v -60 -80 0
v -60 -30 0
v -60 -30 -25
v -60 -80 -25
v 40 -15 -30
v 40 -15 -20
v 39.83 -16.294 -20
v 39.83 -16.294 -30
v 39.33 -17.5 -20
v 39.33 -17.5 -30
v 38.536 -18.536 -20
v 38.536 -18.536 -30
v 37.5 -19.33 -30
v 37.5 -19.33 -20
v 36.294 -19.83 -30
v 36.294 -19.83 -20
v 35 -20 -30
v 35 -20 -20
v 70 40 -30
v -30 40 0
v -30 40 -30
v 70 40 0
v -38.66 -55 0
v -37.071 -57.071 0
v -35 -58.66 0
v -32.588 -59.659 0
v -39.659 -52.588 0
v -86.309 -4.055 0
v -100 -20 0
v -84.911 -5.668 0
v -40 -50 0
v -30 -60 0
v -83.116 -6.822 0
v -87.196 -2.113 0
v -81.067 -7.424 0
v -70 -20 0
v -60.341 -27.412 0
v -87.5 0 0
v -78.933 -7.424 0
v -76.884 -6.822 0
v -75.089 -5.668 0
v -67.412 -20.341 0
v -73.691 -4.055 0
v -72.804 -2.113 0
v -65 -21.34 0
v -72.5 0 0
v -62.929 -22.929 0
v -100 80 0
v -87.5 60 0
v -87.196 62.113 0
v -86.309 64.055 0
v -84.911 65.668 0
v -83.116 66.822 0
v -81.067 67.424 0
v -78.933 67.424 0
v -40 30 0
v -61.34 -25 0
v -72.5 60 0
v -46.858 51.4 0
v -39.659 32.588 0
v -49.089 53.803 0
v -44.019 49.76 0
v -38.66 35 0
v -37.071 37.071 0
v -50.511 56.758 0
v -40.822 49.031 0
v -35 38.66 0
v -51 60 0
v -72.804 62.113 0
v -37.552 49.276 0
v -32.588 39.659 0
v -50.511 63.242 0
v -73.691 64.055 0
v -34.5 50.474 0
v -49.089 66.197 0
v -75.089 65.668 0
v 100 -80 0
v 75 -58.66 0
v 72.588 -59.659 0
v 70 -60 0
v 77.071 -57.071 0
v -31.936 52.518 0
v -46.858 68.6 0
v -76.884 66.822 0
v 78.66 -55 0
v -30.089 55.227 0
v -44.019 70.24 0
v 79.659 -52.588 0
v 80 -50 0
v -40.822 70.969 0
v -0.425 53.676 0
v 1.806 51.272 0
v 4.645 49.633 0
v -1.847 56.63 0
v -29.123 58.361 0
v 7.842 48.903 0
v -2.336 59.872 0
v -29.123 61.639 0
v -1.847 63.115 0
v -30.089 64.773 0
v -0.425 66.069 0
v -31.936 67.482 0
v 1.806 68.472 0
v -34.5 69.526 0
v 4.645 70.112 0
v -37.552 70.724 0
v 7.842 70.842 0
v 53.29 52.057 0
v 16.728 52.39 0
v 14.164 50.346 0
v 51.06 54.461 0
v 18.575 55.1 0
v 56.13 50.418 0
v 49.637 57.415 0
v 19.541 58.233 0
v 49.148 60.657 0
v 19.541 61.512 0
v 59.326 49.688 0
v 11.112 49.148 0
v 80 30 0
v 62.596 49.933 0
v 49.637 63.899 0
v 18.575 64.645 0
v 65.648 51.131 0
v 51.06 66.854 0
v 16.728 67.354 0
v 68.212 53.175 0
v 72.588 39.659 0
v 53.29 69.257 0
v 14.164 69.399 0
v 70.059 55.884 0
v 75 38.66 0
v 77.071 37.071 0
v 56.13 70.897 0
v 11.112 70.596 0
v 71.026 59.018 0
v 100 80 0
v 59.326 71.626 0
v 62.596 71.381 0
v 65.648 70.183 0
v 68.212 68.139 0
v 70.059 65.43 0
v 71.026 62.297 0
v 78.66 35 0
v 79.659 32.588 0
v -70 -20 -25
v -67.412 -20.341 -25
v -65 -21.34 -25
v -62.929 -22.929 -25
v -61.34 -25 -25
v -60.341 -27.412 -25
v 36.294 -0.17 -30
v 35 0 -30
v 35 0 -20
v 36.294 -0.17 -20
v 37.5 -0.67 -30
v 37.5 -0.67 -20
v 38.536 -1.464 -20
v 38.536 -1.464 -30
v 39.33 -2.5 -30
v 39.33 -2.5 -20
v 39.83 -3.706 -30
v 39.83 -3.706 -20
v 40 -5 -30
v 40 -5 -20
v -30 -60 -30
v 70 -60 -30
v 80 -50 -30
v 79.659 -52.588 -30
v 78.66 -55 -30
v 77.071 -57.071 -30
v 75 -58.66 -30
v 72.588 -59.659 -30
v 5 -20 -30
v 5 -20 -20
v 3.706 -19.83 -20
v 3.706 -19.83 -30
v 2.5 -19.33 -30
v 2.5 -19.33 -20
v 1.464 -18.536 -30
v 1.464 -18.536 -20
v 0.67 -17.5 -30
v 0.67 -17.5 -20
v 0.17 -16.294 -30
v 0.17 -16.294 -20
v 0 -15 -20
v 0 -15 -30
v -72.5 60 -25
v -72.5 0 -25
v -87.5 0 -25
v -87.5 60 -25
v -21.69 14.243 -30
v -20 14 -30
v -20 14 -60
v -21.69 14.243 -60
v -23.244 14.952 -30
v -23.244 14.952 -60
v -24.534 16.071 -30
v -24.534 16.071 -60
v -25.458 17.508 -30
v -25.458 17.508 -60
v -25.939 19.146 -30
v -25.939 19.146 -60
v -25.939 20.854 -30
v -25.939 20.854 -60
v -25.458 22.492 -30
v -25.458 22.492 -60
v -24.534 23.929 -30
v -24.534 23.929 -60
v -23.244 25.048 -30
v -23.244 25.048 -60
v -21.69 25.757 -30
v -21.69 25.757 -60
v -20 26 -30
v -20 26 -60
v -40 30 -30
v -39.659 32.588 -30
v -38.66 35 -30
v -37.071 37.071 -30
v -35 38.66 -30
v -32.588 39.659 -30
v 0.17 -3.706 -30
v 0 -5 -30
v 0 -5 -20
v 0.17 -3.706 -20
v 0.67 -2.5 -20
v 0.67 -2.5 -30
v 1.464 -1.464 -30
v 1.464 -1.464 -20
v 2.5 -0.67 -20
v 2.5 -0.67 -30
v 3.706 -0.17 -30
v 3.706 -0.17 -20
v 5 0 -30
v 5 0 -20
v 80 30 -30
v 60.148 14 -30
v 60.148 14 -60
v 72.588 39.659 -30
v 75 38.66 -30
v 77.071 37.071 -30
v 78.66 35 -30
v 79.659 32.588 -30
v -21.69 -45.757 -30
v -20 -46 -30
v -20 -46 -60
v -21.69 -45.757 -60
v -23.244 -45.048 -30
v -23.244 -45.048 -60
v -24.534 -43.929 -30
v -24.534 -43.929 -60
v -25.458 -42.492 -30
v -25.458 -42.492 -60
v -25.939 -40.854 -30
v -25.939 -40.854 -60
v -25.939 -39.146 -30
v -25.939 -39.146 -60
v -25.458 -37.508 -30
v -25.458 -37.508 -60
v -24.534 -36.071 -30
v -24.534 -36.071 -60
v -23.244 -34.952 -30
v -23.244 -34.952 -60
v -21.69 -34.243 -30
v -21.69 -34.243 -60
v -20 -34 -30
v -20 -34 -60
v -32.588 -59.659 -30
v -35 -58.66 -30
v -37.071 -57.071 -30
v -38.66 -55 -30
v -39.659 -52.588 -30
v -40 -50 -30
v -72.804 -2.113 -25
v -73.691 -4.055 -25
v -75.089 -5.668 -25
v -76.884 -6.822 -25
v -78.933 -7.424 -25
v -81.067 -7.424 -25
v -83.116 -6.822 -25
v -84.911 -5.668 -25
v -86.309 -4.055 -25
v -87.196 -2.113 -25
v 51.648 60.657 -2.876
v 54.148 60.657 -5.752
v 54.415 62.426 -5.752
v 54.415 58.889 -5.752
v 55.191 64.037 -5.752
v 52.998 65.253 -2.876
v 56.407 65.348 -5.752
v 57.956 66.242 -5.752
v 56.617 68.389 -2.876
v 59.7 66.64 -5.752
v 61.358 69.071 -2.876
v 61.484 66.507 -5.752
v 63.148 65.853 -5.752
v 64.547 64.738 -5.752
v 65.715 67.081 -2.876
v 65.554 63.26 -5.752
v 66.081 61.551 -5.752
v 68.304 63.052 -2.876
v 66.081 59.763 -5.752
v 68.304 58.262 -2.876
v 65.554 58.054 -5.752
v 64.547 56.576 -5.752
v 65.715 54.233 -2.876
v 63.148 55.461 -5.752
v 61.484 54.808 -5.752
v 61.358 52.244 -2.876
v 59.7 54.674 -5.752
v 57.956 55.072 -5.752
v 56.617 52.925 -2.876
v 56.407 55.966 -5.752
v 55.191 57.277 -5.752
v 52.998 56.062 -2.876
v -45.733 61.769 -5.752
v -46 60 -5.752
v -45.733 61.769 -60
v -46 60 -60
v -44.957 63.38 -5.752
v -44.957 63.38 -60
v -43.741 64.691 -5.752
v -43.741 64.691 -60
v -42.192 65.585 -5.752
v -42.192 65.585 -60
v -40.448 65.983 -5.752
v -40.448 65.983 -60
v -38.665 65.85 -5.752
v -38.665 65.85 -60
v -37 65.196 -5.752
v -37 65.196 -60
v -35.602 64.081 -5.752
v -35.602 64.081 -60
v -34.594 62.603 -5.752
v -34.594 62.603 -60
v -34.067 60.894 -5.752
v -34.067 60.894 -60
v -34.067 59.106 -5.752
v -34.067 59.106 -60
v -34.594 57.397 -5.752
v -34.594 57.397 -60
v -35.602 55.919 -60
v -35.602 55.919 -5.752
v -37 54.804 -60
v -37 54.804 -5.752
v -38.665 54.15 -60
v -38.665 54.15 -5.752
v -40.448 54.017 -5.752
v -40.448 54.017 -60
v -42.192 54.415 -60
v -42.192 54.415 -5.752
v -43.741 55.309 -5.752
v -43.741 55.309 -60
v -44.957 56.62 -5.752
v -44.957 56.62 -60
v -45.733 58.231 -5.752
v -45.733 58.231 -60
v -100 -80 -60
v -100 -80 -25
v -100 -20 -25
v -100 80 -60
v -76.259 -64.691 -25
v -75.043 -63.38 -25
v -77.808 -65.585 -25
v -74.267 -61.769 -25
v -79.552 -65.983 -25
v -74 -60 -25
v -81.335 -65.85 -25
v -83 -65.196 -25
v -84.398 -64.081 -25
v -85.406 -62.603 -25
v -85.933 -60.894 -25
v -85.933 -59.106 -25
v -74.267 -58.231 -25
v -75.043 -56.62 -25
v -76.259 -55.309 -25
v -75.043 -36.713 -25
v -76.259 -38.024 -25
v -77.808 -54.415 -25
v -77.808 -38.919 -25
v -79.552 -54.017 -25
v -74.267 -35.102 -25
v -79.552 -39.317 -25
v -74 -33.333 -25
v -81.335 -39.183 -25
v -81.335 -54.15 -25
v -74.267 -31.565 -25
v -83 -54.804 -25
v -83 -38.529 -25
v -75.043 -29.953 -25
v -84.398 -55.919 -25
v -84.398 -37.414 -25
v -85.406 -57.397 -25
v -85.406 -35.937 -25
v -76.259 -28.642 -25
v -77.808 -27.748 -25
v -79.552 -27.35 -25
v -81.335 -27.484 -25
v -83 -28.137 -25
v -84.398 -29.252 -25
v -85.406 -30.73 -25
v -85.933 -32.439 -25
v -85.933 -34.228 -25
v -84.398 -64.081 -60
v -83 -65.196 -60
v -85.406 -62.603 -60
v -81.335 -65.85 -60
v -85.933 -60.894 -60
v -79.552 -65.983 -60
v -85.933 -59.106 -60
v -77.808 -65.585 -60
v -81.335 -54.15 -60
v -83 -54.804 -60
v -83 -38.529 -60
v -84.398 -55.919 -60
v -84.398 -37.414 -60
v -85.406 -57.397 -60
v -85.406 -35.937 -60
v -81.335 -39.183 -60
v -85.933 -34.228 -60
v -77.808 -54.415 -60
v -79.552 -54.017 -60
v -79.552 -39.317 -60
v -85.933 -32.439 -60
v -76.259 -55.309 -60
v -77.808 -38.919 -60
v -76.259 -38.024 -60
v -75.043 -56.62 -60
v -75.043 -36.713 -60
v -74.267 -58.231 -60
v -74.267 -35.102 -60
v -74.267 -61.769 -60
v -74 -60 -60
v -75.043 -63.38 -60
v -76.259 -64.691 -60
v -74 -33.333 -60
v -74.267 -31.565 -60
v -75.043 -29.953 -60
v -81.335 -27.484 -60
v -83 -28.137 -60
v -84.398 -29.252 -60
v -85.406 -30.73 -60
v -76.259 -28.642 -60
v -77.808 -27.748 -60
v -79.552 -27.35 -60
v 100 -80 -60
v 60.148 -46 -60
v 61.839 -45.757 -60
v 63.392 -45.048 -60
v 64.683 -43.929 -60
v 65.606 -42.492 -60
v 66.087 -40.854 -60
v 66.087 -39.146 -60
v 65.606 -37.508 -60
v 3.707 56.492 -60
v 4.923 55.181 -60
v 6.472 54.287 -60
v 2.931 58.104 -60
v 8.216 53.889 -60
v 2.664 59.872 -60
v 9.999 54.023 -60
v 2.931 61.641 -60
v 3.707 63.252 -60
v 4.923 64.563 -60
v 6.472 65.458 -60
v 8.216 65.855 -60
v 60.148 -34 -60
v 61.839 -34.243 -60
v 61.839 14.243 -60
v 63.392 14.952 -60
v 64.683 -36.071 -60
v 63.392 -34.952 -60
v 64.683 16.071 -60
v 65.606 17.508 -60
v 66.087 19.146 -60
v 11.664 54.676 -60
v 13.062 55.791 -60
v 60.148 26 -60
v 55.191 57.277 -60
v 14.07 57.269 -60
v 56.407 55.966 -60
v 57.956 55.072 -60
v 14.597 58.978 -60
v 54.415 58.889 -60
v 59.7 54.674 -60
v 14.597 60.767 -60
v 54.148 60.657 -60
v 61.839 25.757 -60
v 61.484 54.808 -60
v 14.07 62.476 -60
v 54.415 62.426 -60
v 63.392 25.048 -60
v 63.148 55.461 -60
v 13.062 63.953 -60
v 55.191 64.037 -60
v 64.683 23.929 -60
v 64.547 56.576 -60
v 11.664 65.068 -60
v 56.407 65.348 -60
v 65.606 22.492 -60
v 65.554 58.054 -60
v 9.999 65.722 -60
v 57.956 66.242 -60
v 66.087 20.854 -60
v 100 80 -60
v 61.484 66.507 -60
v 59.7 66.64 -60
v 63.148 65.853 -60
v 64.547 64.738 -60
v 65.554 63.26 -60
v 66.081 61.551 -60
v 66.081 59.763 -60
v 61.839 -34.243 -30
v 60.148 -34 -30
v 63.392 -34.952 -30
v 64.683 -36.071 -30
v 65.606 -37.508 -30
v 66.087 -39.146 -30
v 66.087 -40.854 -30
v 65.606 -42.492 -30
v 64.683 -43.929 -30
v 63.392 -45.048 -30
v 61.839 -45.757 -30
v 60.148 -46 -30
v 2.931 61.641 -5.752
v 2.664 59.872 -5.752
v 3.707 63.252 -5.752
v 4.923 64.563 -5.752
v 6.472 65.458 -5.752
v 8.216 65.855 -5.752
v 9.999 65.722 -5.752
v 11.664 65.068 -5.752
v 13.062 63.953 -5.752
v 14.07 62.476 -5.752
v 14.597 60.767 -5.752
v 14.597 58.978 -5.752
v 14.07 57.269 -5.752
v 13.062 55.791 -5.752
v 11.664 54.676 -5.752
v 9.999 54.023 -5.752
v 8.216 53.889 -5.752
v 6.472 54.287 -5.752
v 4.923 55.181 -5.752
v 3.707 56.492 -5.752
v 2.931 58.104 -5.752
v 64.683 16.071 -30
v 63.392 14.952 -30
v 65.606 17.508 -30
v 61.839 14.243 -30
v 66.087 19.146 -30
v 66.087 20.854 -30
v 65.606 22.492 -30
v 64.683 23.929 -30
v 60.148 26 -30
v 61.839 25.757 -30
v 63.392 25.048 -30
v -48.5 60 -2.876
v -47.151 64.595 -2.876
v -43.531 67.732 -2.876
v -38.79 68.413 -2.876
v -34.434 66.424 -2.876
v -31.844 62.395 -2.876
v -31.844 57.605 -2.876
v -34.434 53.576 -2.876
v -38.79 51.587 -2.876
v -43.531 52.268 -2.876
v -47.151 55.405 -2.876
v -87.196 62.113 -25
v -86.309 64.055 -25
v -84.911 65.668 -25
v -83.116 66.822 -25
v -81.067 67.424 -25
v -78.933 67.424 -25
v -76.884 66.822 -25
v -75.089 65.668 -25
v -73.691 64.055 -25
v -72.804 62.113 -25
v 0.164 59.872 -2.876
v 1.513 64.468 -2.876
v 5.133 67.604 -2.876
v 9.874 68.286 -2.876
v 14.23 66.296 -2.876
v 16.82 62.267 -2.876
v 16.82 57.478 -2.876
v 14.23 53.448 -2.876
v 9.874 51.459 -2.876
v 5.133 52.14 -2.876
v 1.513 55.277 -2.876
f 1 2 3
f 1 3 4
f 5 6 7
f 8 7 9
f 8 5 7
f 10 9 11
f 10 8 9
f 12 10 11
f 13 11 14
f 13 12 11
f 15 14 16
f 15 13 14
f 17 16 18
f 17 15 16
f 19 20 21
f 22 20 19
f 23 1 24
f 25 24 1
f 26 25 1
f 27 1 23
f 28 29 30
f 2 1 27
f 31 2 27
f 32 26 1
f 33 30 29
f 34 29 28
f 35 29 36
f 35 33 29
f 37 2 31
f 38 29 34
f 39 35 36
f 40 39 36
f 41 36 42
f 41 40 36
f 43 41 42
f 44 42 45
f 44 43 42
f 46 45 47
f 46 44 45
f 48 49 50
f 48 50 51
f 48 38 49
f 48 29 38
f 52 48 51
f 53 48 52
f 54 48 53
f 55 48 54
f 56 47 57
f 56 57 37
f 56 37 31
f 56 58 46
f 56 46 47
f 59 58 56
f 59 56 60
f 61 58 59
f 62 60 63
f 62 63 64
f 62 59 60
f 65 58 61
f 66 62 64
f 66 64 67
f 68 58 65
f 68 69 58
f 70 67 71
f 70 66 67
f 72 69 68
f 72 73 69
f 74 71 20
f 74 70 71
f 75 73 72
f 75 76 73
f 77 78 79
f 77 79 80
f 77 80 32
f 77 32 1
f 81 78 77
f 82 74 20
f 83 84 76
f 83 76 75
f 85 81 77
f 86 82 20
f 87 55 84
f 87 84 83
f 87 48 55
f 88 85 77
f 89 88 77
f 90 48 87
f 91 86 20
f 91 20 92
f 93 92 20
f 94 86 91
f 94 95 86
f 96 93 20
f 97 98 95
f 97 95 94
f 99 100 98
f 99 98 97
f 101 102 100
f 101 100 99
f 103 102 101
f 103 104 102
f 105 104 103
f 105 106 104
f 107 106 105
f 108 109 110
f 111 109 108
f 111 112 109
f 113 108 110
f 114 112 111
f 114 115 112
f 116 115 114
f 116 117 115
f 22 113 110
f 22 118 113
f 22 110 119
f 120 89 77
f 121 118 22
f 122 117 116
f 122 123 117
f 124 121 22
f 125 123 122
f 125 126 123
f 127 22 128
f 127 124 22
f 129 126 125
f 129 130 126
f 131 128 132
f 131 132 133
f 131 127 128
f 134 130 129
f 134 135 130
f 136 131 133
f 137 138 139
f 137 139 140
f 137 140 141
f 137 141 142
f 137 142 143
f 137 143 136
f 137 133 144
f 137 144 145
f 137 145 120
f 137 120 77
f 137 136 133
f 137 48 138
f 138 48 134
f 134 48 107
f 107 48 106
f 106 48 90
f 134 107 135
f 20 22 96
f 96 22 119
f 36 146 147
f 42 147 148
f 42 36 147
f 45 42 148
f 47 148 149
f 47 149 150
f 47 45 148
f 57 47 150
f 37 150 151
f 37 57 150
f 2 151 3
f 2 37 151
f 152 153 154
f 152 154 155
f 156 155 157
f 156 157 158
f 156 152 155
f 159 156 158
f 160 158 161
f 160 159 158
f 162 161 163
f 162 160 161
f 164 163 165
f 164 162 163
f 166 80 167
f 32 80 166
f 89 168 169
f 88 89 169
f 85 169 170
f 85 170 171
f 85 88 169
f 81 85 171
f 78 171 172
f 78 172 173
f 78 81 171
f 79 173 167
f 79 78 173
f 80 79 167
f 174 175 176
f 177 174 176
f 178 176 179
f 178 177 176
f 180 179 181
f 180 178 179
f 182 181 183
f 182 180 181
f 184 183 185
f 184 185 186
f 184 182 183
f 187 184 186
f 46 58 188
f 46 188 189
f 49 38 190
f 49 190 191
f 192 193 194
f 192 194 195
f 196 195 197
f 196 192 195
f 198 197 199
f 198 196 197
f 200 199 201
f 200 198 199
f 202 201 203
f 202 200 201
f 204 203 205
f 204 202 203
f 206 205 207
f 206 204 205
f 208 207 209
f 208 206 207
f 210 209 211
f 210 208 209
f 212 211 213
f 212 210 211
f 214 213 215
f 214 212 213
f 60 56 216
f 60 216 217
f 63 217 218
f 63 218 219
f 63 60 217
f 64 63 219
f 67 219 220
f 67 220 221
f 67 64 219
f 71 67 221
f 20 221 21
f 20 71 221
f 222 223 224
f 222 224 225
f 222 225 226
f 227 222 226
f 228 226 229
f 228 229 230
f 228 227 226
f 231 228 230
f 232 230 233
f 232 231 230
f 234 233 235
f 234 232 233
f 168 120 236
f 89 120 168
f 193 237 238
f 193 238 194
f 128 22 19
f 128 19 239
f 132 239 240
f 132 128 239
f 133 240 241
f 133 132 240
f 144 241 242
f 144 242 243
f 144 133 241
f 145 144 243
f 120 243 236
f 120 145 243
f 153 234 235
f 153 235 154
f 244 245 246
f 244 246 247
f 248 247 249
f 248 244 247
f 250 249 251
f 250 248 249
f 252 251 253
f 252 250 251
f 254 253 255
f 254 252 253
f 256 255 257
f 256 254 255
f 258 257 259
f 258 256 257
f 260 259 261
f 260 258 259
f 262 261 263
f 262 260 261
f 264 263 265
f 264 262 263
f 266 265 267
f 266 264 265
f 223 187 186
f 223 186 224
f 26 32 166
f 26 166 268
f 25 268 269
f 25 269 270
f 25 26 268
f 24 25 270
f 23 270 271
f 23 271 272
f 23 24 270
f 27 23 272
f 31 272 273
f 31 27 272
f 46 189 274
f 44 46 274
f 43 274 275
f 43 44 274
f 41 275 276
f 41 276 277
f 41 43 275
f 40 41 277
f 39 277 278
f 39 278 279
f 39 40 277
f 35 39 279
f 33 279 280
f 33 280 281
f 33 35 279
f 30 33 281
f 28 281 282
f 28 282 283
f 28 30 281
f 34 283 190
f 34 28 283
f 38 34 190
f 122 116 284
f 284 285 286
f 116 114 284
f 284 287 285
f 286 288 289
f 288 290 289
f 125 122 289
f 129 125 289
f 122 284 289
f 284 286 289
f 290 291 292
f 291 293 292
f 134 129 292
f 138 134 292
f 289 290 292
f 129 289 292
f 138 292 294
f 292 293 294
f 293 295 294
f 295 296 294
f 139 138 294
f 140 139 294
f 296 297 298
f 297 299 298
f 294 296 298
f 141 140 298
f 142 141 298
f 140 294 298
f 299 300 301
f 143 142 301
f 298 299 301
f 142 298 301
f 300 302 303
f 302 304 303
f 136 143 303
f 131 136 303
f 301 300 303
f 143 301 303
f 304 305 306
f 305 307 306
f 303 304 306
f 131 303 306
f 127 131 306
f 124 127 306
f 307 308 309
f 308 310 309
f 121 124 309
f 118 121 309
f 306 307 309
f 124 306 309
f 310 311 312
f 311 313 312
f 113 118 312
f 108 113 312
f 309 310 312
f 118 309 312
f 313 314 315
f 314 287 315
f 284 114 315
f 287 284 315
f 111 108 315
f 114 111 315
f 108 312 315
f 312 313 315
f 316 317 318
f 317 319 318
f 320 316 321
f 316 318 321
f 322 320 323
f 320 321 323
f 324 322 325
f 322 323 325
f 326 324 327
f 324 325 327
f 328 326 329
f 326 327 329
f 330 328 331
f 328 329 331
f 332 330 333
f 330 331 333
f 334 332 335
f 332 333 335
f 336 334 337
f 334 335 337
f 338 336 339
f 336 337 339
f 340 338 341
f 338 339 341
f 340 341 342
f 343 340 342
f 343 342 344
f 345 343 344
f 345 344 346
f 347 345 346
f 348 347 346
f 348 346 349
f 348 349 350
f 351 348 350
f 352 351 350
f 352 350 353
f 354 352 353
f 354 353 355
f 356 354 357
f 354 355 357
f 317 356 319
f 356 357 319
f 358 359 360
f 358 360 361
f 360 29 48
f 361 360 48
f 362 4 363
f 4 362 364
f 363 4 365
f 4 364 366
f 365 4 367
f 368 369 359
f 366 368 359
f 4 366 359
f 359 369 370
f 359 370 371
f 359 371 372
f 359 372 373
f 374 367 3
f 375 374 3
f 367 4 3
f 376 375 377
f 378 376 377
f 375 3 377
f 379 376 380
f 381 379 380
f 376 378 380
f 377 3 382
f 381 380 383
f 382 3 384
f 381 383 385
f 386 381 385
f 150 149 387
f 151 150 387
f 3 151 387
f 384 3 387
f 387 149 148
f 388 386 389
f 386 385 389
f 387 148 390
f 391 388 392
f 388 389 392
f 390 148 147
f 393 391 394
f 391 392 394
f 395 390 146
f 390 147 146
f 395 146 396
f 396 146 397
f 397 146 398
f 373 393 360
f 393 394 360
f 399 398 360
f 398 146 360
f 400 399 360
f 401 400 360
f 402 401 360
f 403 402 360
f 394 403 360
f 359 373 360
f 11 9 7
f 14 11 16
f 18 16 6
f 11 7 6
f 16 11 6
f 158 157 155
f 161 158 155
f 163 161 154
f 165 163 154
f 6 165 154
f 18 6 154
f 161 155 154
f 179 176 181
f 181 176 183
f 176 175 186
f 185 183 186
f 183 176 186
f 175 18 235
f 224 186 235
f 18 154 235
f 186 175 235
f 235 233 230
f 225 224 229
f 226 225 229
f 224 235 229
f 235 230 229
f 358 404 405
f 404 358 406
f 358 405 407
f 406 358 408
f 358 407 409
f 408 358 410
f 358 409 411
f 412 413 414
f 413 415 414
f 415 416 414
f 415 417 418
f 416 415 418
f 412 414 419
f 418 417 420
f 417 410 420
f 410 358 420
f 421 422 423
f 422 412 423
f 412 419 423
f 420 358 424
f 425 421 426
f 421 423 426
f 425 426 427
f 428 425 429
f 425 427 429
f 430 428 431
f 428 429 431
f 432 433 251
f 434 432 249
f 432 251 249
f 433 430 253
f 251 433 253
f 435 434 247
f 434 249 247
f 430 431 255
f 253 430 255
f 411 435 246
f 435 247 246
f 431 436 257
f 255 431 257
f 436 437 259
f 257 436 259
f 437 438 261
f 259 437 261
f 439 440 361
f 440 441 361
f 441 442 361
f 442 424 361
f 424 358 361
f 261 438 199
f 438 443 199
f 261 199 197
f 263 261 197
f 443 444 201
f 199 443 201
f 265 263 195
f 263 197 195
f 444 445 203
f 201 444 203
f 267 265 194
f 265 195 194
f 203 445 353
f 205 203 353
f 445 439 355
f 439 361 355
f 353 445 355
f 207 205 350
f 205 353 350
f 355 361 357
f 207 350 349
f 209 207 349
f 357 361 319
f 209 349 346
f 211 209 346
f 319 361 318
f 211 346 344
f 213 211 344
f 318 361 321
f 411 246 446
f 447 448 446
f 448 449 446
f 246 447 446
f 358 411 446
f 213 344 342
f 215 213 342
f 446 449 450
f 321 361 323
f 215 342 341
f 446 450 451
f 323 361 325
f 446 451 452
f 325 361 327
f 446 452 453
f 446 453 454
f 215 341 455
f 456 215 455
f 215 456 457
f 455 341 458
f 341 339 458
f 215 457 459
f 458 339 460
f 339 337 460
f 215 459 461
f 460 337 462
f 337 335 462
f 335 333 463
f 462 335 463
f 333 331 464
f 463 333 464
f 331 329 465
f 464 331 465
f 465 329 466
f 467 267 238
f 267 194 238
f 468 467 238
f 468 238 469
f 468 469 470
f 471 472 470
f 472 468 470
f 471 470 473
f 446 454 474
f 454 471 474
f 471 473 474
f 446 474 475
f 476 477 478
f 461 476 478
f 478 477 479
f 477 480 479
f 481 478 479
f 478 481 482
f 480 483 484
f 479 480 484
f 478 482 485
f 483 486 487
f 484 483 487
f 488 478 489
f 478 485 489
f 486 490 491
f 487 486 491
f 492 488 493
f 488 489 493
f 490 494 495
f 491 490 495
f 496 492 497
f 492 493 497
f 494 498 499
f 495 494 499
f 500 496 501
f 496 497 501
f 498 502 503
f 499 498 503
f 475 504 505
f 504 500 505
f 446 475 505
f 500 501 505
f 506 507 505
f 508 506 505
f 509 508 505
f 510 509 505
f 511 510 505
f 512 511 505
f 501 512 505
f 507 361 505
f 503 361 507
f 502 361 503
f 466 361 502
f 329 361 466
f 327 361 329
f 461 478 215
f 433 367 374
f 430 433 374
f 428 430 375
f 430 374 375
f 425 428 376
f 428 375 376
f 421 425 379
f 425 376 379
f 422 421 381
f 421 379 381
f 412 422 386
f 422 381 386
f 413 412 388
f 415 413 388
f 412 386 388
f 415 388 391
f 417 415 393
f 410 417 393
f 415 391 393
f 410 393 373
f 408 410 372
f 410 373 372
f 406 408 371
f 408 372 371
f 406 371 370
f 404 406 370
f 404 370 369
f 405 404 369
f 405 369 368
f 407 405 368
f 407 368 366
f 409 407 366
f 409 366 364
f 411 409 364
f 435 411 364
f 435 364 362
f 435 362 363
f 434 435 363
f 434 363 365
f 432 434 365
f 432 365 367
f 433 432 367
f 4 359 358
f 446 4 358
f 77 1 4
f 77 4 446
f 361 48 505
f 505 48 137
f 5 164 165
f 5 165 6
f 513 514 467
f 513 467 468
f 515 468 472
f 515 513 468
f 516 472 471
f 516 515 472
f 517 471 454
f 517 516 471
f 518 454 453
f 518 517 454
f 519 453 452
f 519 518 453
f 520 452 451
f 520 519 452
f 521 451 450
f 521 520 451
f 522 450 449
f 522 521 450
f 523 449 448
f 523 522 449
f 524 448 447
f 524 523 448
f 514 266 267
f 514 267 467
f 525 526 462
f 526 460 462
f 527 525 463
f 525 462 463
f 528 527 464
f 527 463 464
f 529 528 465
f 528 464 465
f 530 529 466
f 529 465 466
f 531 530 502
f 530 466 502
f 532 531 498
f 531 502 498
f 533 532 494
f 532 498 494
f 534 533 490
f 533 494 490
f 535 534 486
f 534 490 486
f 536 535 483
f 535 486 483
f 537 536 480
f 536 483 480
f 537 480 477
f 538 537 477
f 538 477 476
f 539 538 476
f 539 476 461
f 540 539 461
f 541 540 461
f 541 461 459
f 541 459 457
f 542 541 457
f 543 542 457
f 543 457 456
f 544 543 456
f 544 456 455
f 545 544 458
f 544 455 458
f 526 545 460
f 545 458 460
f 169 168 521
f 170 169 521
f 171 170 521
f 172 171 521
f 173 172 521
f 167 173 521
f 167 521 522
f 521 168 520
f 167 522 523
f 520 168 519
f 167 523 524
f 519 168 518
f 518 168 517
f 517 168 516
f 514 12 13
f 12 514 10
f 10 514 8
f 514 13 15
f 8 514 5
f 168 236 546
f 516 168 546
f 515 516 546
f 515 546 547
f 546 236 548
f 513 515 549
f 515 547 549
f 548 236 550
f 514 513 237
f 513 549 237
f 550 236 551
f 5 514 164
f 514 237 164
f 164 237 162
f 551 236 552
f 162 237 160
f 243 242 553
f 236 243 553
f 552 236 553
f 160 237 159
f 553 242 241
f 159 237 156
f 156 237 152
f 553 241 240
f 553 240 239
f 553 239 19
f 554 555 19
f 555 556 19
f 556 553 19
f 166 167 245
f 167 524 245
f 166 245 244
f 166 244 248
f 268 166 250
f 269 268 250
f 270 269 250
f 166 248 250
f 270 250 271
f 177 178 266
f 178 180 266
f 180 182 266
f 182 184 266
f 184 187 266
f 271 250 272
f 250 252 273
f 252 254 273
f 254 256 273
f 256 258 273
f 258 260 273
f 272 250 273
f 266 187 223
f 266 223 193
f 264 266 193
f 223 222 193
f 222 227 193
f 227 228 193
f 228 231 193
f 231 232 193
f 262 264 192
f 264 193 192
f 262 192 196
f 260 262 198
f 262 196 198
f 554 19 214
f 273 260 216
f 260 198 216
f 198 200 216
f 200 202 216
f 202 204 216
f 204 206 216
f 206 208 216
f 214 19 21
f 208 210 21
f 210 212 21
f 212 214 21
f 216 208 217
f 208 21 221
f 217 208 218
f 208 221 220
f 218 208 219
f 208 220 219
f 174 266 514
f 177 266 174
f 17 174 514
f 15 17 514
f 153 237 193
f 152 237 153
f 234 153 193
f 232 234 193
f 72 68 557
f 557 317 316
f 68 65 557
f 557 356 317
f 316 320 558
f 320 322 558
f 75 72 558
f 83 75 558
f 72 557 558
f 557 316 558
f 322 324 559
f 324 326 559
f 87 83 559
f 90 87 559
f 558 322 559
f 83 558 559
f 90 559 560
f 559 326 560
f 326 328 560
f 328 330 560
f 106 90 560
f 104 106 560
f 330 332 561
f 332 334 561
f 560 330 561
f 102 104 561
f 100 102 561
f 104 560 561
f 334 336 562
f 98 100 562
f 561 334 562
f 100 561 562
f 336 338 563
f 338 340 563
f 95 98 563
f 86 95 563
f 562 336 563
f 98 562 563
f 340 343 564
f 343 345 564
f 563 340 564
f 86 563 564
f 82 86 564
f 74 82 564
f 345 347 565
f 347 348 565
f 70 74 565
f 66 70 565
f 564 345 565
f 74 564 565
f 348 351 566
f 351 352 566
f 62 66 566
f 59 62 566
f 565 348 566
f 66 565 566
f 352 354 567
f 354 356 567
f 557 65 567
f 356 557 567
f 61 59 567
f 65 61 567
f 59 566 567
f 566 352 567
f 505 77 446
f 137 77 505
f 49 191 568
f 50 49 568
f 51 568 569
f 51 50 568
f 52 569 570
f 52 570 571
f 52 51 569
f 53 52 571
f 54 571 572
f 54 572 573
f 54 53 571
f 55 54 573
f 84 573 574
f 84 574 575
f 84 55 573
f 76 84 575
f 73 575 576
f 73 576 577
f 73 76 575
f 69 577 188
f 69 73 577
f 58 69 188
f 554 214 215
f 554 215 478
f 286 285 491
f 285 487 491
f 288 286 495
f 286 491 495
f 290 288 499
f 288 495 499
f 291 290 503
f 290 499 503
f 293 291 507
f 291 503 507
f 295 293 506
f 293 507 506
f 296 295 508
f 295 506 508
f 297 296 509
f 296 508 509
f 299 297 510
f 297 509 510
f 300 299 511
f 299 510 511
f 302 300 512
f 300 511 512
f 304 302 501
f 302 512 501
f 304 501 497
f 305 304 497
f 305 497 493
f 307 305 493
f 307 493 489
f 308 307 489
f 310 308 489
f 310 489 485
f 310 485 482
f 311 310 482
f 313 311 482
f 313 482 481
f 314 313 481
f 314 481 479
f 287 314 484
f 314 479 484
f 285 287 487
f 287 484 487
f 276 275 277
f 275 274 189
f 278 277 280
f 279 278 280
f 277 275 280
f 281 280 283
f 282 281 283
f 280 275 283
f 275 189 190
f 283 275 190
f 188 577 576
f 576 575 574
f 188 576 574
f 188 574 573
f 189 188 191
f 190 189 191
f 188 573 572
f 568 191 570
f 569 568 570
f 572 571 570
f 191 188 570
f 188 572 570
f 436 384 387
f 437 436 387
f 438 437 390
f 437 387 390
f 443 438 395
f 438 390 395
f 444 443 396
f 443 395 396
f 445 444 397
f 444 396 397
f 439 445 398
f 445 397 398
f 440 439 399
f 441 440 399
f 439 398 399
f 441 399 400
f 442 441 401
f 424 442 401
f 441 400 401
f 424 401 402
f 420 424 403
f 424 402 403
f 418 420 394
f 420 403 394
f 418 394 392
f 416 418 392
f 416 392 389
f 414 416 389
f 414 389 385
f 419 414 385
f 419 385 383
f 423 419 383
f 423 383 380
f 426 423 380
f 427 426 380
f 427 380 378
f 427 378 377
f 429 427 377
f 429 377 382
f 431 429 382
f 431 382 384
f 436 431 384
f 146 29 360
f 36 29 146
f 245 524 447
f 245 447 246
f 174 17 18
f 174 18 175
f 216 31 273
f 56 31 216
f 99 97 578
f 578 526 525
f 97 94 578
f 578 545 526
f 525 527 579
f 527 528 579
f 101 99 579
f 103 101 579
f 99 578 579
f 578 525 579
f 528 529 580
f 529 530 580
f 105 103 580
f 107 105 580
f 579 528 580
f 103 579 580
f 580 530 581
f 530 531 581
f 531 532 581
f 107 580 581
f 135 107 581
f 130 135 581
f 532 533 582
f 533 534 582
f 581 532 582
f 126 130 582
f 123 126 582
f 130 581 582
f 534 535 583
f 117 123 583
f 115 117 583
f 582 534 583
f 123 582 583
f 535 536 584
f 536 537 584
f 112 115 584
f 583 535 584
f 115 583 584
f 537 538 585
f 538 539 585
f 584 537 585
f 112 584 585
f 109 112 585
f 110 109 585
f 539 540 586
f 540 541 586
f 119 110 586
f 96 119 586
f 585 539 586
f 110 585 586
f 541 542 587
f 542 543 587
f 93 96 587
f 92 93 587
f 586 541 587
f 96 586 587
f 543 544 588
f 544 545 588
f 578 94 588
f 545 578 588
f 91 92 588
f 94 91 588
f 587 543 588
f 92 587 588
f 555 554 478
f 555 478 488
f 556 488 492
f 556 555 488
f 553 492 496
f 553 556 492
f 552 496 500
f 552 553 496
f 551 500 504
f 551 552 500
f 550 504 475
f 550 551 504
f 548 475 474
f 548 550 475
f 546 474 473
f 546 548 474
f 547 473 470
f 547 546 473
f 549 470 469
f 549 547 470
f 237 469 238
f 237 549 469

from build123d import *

# Parameters (mm, degrees)
SKETCH1_W           = 200
SKETCH1_H           = 160
BASE_EXTRUDE_DEPTH  = 60
CUT_EXTRUDE1_DEPTH  = 30
CUT_EXTRUDE2_DEPTH  = 25
HOLE1_D             = 12
HOLE1_CSINK_D       = 22
HOLE1_CSINK_ANGLE   = 82
HOLE4_D             = 12
HOLE4_CSINK_D       = 22
HOLE4_CSINK_ANGLE   = 82
HOLE5_D             = 12
HOLE5_CSINK_D       = 22
HOLE5_CSINK_ANGLE   = 82
SKETCH21_R          = 6
CUT_EXTRUDE4_DEPTH  = 133.759180474
CUT_EXTRUDE5_DEPTH  = 25
CUT_EXTRUDE6_DEPTH  = 132.52946438
BOSS_EXTRUDE1_DEPTH = 10


with BuildPart() as part:
    # Sketch1 → Base-Extrude (new body)
    with BuildSketch(Plane.XY):
        Rectangle(SKETCH1_W, SKETCH1_H)
    extrude(amount=-BASE_EXTRUDE_DEPTH)

    # Sketch2 → Cut-Extrude1 (cut)
    with BuildSketch(Plane.XY):
        with BuildLine():
            Line((-30, 40), (70, 40))
            ThreePointArc((70, 40), (77.071067812, 37.071067812), (80, 30))
            Line((80, 30), (80, -50))
            ThreePointArc((80, -50), (77.071067812, -57.071067812), (70, -60))
            Line((70, -60), (-30, -60))
            ThreePointArc((-30, -60), (-37.071067812, -57.071067812), (-40, -50))
            Line((-40, -50), (-40, 30))
            ThreePointArc((-40, 30), (-37.071067812, 37.071067812), (-30, 40))
        make_face()
    extrude(amount=-CUT_EXTRUDE1_DEPTH, mode=Mode.SUBTRACT)

    # Sketch3 → Cut-Extrude2 (cut)
    with BuildSketch(Plane.XY):
        with BuildLine():
            Line((-120, -20), (-70, -20))
            ThreePointArc((-70, -20), (-62.928932188, -22.928932188), (-60, -30))
            Line((-60, -30), (-60, -100))
            Line((-60, -100), (-120, -100))
            Line((-120, -100), (-120, -20))
        make_face()
    extrude(amount=-CUT_EXTRUDE2_DEPTH, mode=Mode.SUBTRACT)

    # Hole1 (through all)
    with Locations(Plane.XY):
        with Locations((-40, 60)):
            CounterSinkHole(HOLE1_D / 2, HOLE1_CSINK_D / 2, counter_sink_angle=HOLE1_CSINK_ANGLE)

    # Hole4 (through all)
    with Locations(Plane(origin=(41.997272993, -0.127725249, 0), x_dir=(1, 0, 0), z_dir=(0, 0, 1))):
        with Locations((-33.333333333, 60)):
            CounterSinkHole(HOLE4_D / 2, HOLE4_CSINK_D / 2, counter_sink_angle=HOLE4_CSINK_ANGLE)

    # Hole5 (through all)
    with Locations(Plane(origin=(100.148393301, 0.657149803, 0), x_dir=(1, 0, 0), z_dir=(0, 0, 1))):
        with Locations((-40, 60)):
            CounterSinkHole(HOLE5_D / 2, HOLE5_CSINK_D / 2, counter_sink_angle=HOLE5_CSINK_ANGLE)

    # Sketch21 → Cut-Extrude4 (cut, through all)
    with BuildSketch(Plane.XY.offset(-25)):
        with Locations((-80, -33.333333333)):
            Circle(SKETCH21_R)
        with Locations((-80, -60)):
            Circle(SKETCH21_R)
    extrude(amount=-CUT_EXTRUDE4_DEPTH, mode=Mode.SUBTRACT)

    # Sketch22 → Cut-Extrude5 (cut)
    with BuildSketch(Plane.XY):
        with BuildLine():
            Line((-72.5, 60), (-72.5, 0))
            ThreePointArc((-72.5, 0), (-80, -7.5), (-87.5, 0))
            Line((-87.5, 0), (-87.5, 60))
            ThreePointArc((-87.5, 60), (-80, 67.5), (-72.5, 60))
        make_face()
    extrude(amount=-CUT_EXTRUDE5_DEPTH, mode=Mode.SUBTRACT)

    # Sketch23 → Cut-Extrude6 (cut, through all)
    with BuildSketch(Plane.XY.offset(-30)):
        with BuildLine():
            Line((-20, 26), (60.148393301, 26))
            ThreePointArc((60.148393301, 26), (66.148393301, 20), (60.148393301, 14))
            Line((60.148393301, 14), (-20, 14))
            ThreePointArc((-20, 14), (-26, 20), (-20, 26))
        make_face()
        with BuildLine():
            Line((-20, -34), (60.148393301, -34))
            ThreePointArc((60.148393301, -34), (66.148393301, -40), (60.148393301, -46))
            Line((60.148393301, -46), (-20, -46))
            ThreePointArc((-20, -46), (-26, -40), (-20, -34))
        make_face()
    extrude(amount=-CUT_EXTRUDE6_DEPTH, mode=Mode.SUBTRACT)

    # Sketch24 → Boss-Extrude1 (add)
    with BuildSketch(Plane.XY.offset(-30)):
        with BuildLine():
            Line((5, 0), (35, 0))
            ThreePointArc((35, 0), (38.535533906, -1.464466094), (40, -5))
            Line((40, -5), (40, -15))
            ThreePointArc((40, -15), (38.535533906, -18.535533906), (35, -20))
            Line((35, -20), (5, -20))
            ThreePointArc((5, -20), (1.464466094, -18.535533906), (0, -15))
            Line((0, -15), (0, -5))
            ThreePointArc((0, -5), (1.464466094, -1.464466094), (5, 0))
        make_face()
    extrude(amount=BOSS_EXTRUDE1_DEPTH)


solid = part.part
